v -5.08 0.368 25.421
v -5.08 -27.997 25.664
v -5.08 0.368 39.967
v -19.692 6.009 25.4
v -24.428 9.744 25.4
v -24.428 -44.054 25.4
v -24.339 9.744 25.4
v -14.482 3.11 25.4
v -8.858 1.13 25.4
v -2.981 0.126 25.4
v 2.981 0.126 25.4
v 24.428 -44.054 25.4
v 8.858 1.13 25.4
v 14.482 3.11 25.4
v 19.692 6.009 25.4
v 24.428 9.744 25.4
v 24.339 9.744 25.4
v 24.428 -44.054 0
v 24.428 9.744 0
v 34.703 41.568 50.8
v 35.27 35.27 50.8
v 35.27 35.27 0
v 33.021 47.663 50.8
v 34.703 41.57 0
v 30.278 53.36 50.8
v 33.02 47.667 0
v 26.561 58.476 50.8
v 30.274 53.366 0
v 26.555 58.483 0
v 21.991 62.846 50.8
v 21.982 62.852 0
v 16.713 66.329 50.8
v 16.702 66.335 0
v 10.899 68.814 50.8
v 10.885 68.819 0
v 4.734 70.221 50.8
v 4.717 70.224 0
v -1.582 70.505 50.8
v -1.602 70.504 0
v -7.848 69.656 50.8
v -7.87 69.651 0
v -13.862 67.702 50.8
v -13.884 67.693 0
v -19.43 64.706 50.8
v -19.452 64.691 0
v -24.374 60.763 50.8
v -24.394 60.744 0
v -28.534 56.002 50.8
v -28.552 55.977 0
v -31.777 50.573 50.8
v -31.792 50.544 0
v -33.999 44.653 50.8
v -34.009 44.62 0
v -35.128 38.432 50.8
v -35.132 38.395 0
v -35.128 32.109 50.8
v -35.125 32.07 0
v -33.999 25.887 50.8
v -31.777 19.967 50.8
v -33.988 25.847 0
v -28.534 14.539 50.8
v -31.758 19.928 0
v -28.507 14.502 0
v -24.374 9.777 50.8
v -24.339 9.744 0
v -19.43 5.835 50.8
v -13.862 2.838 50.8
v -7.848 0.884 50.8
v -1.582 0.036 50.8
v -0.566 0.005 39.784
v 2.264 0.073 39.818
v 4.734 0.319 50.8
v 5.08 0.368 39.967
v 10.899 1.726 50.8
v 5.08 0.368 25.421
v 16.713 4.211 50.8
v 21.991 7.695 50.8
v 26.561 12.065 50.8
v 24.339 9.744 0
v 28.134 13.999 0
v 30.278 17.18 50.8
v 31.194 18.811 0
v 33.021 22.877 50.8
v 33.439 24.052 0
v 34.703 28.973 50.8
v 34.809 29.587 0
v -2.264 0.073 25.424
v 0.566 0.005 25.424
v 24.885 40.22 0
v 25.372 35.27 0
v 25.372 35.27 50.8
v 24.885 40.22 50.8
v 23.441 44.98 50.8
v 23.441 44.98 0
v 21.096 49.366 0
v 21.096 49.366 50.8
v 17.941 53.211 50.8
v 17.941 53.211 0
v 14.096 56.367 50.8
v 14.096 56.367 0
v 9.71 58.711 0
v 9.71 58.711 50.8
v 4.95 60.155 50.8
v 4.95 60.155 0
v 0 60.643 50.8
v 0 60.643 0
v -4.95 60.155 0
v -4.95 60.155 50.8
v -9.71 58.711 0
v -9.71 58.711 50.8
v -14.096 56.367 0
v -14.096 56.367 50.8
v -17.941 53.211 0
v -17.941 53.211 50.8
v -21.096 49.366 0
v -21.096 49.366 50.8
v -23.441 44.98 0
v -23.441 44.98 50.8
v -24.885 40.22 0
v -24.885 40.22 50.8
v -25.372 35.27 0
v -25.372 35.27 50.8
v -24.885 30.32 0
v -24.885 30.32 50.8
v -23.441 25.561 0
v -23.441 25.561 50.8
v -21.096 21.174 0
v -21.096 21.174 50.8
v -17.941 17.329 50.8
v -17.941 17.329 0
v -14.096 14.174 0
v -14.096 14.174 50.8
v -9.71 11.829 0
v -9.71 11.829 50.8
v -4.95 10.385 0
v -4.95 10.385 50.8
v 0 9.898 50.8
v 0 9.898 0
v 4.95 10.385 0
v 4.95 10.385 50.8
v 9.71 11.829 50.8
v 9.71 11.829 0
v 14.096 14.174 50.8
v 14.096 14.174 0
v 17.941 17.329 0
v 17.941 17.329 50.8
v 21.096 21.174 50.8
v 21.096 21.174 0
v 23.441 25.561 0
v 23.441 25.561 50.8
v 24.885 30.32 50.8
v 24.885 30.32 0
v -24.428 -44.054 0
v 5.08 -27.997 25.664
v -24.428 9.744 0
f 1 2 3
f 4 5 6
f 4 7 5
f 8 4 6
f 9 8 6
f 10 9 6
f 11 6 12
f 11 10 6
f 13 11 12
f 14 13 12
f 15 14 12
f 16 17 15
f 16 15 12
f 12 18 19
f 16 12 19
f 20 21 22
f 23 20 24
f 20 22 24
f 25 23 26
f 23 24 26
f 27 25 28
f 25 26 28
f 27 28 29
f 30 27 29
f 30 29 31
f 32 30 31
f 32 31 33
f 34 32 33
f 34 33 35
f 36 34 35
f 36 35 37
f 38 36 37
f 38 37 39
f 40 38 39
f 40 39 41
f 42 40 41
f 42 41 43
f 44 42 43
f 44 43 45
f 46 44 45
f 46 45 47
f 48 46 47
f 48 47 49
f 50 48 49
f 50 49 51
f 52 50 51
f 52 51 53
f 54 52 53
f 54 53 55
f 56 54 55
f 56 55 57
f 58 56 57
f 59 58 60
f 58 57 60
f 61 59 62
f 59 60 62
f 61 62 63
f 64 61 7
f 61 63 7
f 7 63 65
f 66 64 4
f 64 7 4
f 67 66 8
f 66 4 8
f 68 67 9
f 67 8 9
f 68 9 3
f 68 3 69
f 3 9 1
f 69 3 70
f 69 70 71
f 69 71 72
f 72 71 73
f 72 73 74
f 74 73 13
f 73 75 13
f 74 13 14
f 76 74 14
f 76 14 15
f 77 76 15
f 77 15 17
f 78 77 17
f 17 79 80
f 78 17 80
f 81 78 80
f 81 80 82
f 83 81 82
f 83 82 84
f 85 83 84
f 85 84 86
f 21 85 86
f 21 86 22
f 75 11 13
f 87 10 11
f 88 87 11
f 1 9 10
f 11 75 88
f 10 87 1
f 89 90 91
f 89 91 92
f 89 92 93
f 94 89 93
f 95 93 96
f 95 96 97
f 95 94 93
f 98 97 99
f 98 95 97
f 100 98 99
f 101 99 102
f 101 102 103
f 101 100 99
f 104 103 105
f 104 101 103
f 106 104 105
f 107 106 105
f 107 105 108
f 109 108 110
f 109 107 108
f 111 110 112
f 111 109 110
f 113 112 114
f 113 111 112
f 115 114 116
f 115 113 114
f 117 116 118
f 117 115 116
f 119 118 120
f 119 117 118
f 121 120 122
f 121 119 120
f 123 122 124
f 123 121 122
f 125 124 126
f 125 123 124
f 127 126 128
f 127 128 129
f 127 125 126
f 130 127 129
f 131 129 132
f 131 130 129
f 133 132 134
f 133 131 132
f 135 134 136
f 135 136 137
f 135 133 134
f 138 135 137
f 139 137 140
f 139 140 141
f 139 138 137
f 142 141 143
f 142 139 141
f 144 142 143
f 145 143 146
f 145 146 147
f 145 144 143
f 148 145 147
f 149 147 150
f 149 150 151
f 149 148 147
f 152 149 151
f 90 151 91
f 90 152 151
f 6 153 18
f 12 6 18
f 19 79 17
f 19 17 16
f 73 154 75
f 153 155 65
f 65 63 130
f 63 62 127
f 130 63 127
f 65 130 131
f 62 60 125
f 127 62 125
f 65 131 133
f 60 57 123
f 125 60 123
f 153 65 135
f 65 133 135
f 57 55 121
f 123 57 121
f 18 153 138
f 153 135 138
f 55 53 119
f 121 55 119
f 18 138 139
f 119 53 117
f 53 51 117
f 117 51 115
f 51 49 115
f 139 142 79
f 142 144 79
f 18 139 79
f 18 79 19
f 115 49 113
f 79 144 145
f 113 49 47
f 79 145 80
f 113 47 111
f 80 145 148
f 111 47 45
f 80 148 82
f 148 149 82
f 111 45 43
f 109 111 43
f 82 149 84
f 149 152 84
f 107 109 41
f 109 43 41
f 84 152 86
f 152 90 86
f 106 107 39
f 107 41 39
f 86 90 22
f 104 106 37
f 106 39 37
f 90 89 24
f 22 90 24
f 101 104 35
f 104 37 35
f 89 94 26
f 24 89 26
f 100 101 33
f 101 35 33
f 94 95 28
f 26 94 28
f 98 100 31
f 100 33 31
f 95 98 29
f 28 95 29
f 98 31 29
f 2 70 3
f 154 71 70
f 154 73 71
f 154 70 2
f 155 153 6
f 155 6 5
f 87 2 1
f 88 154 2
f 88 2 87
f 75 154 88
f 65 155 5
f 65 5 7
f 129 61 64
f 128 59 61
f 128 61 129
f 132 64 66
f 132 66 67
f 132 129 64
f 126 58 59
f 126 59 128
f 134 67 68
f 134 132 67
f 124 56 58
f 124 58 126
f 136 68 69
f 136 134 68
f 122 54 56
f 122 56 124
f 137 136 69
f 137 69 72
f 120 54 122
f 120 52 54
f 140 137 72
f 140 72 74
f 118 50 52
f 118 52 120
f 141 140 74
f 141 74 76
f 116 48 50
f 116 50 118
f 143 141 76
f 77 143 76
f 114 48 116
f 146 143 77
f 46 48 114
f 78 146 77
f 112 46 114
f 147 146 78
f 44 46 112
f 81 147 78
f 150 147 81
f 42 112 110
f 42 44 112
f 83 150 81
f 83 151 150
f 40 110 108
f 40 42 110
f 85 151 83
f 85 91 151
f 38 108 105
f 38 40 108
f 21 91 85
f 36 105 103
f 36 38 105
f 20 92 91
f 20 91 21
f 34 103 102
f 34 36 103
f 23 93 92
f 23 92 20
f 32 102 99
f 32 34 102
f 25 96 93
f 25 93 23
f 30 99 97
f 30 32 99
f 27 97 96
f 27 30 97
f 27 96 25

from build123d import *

# Parameters (mm, degrees)
F0_R     = 35.27027
F0_R_2   = 25.372409
F1_DEPTH = 50.8
F2_W     = 48.85688
F2_H     = 53.797463
F3_DEPTH = 25.4
F5_DEPTH = 5.08


with BuildPart() as f1:
    # F0 (on Top) → F1 (new body)
    with BuildSketch(Plane.XY):
        with Locations((0, 35.27027)):
            Circle(F0_R)
        with Locations((0, 35.27027)):
            Circle(F0_R_2, mode=Mode.SUBTRACT)
    extrude(amount=F1_DEPTH)

    # F2 (on Top) → F3 (join)
    with BuildSketch(Plane.XY):
        with Locations((0, -17.154805)):
            Rectangle(F2_W, F2_H)
    extrude(amount=F3_DEPTH)

    # F4 (on Right) → F5 (join, symmetric)
    with BuildSketch(Plane.YZ):
        Polygon((-27.996639, 25.663584), (4.117153, 25.389109), (4.117153, 41.857719), align=None)
    extrude(amount=F5_DEPTH, both=True)


solid = f1.part
